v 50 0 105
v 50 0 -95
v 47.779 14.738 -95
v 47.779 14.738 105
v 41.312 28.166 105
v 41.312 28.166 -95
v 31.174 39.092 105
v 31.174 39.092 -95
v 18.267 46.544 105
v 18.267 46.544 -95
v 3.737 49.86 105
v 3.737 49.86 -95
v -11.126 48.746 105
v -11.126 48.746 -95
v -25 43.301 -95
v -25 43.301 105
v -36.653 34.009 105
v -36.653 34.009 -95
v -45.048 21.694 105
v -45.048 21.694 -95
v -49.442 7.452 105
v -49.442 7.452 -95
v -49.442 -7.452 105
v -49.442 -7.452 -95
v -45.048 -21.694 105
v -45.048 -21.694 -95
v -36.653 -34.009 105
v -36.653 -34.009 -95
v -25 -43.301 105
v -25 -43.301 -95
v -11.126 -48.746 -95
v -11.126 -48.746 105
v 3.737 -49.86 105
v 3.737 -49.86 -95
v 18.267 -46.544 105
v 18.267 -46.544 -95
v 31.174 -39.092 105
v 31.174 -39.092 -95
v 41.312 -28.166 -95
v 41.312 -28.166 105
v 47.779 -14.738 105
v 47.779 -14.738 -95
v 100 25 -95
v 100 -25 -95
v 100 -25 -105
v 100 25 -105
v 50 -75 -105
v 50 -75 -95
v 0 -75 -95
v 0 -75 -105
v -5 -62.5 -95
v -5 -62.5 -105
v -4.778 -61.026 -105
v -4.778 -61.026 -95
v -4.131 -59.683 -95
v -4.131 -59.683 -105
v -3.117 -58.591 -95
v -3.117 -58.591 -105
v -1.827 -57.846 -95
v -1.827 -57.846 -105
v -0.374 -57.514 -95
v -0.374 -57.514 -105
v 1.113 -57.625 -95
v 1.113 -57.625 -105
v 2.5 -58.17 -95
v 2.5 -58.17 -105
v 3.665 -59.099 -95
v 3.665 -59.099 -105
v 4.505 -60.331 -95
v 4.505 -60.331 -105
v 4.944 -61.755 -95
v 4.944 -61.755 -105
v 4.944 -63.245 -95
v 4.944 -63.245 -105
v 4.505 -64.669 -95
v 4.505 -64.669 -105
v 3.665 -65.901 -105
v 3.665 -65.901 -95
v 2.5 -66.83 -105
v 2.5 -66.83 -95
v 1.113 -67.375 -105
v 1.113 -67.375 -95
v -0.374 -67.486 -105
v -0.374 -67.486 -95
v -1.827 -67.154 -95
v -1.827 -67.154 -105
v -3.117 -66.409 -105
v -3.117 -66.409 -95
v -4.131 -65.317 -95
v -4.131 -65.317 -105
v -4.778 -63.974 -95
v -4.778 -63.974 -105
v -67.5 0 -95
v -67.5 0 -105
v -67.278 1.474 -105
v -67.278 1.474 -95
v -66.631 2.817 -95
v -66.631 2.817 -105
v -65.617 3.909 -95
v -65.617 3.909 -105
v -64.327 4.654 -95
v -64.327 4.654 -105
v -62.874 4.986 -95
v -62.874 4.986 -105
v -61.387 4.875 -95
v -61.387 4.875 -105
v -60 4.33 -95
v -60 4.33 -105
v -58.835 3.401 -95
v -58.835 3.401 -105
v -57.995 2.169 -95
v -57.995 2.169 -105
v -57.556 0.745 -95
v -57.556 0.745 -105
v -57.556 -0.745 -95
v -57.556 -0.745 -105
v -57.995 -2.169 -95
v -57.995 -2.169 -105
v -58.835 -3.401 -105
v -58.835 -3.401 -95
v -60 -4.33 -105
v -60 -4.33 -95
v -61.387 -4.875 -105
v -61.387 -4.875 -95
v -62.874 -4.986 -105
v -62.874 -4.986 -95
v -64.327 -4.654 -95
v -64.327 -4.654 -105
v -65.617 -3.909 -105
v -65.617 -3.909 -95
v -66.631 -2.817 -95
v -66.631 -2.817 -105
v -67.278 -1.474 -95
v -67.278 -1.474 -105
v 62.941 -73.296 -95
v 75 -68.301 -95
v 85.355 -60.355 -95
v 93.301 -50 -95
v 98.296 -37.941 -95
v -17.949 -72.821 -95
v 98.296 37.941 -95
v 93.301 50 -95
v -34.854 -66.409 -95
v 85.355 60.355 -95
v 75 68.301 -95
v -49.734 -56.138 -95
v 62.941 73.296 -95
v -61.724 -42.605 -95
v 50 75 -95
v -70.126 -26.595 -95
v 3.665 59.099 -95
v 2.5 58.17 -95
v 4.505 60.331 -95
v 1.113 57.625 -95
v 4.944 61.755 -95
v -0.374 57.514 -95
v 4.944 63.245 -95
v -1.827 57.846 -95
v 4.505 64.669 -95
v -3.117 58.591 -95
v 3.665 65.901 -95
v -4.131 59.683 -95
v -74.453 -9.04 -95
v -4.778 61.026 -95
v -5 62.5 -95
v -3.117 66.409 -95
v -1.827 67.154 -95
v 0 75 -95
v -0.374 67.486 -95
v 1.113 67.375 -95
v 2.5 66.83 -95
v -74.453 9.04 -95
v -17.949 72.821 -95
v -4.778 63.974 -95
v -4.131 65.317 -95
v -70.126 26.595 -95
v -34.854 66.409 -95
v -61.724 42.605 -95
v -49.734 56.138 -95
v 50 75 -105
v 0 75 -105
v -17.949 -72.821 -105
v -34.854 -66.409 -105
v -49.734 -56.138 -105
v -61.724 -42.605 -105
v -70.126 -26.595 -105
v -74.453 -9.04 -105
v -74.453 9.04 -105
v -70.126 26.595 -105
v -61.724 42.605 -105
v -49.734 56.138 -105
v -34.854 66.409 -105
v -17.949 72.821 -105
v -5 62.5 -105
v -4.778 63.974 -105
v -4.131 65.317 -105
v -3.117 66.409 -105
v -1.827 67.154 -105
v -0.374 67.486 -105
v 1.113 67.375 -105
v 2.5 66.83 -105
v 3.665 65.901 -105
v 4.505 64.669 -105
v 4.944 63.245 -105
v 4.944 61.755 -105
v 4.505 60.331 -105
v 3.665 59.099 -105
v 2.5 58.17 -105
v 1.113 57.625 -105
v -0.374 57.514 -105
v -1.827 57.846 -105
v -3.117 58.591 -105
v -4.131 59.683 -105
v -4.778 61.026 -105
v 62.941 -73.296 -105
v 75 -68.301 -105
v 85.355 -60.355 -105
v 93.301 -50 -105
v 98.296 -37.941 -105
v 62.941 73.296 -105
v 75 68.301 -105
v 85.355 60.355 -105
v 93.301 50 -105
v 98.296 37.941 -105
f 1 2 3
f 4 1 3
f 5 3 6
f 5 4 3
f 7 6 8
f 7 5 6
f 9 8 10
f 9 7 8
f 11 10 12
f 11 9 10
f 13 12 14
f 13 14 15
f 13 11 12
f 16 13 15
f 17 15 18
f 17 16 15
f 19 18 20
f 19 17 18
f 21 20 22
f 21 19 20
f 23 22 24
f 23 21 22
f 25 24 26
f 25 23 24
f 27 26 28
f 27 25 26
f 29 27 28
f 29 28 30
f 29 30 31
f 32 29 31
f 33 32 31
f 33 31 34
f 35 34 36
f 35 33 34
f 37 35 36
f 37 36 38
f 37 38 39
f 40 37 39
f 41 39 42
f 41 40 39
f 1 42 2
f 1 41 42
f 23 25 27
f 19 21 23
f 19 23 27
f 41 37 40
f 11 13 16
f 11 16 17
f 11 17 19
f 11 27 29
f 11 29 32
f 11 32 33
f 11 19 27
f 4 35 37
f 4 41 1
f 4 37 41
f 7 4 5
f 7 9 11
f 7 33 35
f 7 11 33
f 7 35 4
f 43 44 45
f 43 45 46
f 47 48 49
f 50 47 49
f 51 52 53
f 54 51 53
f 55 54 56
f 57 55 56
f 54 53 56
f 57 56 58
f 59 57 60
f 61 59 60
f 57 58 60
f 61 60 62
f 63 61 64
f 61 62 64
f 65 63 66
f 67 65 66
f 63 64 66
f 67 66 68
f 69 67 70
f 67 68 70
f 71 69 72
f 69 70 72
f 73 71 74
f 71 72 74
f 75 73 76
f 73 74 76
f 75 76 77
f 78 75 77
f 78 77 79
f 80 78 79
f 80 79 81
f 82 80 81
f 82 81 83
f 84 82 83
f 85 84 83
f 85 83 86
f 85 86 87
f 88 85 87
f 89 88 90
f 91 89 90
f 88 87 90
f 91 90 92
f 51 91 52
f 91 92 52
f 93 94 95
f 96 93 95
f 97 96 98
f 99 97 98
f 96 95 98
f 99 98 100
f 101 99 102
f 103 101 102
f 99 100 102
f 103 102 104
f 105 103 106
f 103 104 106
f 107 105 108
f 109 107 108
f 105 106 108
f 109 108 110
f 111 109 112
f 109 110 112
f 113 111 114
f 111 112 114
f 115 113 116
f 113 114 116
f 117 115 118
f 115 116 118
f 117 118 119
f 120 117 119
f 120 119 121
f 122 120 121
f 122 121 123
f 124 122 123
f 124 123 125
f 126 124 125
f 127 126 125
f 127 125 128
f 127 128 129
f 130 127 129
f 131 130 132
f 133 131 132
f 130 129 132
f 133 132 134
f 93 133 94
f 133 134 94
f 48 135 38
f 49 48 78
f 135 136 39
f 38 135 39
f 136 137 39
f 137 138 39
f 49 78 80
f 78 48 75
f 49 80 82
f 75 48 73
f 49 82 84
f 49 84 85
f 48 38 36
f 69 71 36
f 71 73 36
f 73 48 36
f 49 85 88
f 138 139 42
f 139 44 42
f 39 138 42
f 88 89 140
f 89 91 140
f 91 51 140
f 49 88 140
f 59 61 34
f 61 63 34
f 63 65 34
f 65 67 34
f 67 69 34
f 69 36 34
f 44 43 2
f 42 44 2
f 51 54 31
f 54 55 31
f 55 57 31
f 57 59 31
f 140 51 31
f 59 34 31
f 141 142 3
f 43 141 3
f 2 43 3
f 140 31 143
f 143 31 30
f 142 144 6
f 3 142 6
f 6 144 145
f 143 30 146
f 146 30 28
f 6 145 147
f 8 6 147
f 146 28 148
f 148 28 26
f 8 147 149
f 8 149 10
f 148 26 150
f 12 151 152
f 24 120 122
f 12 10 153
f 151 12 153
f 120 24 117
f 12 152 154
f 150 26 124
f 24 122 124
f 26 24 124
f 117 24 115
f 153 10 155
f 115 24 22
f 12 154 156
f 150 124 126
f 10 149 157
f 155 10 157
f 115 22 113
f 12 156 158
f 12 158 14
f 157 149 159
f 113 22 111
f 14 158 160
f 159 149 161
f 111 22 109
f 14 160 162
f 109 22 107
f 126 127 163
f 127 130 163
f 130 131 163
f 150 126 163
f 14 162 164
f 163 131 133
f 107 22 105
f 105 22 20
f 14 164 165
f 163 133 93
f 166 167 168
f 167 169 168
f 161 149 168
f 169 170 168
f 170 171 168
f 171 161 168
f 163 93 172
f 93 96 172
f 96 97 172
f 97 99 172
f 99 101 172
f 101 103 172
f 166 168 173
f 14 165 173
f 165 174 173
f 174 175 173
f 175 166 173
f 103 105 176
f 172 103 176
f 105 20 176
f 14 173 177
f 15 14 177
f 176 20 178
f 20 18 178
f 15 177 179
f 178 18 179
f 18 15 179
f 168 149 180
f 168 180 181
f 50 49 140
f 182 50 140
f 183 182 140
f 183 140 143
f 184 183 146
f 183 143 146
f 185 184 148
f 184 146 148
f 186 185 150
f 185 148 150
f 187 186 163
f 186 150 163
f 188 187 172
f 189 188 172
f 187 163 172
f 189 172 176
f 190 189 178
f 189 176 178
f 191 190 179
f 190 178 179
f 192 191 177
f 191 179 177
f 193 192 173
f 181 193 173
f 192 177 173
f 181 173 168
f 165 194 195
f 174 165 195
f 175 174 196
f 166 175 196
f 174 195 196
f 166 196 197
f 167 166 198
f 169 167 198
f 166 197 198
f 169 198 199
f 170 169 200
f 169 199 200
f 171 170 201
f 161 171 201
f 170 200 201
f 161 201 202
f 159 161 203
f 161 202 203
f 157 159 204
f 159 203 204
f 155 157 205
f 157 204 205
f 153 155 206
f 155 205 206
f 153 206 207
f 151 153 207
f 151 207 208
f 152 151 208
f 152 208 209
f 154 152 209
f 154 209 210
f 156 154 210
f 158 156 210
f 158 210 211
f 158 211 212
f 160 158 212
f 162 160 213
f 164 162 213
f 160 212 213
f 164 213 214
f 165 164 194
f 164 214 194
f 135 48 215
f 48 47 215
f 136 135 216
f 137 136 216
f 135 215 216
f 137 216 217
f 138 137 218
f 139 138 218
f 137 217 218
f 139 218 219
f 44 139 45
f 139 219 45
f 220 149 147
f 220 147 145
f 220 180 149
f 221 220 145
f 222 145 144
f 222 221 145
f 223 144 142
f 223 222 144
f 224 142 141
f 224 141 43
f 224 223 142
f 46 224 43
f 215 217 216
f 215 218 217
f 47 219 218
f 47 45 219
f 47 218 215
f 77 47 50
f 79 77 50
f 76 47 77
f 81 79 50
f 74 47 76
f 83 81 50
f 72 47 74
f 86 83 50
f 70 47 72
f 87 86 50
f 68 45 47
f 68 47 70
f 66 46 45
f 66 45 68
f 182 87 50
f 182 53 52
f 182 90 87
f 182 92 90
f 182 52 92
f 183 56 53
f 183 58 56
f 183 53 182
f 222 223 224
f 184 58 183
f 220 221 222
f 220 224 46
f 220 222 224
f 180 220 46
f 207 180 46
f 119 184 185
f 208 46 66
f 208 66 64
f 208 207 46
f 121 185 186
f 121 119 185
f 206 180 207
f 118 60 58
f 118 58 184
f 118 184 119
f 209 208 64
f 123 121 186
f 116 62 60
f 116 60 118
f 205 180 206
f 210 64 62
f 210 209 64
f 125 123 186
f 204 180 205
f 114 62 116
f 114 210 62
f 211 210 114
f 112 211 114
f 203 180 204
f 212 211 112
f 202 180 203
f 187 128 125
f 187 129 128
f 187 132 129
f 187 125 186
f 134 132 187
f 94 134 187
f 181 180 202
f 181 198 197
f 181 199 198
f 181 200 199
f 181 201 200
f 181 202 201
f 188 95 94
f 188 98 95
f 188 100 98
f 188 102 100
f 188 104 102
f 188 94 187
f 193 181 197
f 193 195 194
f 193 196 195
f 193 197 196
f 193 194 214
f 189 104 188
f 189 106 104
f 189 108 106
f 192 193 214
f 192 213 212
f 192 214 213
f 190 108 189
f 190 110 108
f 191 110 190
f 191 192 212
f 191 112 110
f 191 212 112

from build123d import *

# Parameters (mm, degrees)
SKETCH1_R           = 50
BOSS_EXTRUDE1_DEPTH = 105
BOSS_EXTRUDE3_START = -10
SKETCH2_R           = 50
SKETCH2_W           = 100
SKETCH2_H           = 150
BOSS_EXTRUDE3_DEPTH = 10
SKETCH3_R           = 5
CUT_EXTRUDE1_DEPTH  = 10
FILLET1_R           = 50


with BuildPart() as part:
    # Sketch1 → Boss-Extrude1 (new, symmetric)
    with BuildSketch(Plane.XY):
        Circle(SKETCH1_R)
    extrude(amount=BOSS_EXTRUDE1_DEPTH, both=True)

    # Sketch2 → Boss-Extrude3 (add)
    with BuildSketch(Plane(origin=(0, 0, -105), x_dir=(-1, 0, 0), z_dir=(0, 0, -1)).offset(BOSS_EXTRUDE3_START)):
        Circle(SKETCH2_R)
        with BuildLine():
            Line((0, 75), (0, -75))
            ThreePointArc((0, -75), (75, 0), (0, 75))
        make_face()
        with Locations((-50, 0)):
            Rectangle(SKETCH2_W, SKETCH2_H)
    extrude(amount=BOSS_EXTRUDE3_DEPTH)

    # Sketch3 → Cut-Extrude1 (cut)
    with BuildSketch(Plane(origin=(0, 0, -105), x_dir=(-1, 0, 0), z_dir=(0, 0, -1))):
        with Locations((0, 62.5)):
            Circle(SKETCH3_R)
        with Locations((62.5, 0)):
            Circle(SKETCH3_R)
        with Locations((0, -62.5)):
            Circle(SKETCH3_R)
    extrude(amount=-CUT_EXTRUDE1_DEPTH, mode=Mode.SUBTRACT)

    # Fillet1
    fillet1_edges = [part.edges().sort_by_distance(p)[0] for p in [
        (100, -75, -100),
        (100, 75, -100),
    ]]
    fillet(fillet1_edges, radius=FILLET1_R)


solid = part.part
